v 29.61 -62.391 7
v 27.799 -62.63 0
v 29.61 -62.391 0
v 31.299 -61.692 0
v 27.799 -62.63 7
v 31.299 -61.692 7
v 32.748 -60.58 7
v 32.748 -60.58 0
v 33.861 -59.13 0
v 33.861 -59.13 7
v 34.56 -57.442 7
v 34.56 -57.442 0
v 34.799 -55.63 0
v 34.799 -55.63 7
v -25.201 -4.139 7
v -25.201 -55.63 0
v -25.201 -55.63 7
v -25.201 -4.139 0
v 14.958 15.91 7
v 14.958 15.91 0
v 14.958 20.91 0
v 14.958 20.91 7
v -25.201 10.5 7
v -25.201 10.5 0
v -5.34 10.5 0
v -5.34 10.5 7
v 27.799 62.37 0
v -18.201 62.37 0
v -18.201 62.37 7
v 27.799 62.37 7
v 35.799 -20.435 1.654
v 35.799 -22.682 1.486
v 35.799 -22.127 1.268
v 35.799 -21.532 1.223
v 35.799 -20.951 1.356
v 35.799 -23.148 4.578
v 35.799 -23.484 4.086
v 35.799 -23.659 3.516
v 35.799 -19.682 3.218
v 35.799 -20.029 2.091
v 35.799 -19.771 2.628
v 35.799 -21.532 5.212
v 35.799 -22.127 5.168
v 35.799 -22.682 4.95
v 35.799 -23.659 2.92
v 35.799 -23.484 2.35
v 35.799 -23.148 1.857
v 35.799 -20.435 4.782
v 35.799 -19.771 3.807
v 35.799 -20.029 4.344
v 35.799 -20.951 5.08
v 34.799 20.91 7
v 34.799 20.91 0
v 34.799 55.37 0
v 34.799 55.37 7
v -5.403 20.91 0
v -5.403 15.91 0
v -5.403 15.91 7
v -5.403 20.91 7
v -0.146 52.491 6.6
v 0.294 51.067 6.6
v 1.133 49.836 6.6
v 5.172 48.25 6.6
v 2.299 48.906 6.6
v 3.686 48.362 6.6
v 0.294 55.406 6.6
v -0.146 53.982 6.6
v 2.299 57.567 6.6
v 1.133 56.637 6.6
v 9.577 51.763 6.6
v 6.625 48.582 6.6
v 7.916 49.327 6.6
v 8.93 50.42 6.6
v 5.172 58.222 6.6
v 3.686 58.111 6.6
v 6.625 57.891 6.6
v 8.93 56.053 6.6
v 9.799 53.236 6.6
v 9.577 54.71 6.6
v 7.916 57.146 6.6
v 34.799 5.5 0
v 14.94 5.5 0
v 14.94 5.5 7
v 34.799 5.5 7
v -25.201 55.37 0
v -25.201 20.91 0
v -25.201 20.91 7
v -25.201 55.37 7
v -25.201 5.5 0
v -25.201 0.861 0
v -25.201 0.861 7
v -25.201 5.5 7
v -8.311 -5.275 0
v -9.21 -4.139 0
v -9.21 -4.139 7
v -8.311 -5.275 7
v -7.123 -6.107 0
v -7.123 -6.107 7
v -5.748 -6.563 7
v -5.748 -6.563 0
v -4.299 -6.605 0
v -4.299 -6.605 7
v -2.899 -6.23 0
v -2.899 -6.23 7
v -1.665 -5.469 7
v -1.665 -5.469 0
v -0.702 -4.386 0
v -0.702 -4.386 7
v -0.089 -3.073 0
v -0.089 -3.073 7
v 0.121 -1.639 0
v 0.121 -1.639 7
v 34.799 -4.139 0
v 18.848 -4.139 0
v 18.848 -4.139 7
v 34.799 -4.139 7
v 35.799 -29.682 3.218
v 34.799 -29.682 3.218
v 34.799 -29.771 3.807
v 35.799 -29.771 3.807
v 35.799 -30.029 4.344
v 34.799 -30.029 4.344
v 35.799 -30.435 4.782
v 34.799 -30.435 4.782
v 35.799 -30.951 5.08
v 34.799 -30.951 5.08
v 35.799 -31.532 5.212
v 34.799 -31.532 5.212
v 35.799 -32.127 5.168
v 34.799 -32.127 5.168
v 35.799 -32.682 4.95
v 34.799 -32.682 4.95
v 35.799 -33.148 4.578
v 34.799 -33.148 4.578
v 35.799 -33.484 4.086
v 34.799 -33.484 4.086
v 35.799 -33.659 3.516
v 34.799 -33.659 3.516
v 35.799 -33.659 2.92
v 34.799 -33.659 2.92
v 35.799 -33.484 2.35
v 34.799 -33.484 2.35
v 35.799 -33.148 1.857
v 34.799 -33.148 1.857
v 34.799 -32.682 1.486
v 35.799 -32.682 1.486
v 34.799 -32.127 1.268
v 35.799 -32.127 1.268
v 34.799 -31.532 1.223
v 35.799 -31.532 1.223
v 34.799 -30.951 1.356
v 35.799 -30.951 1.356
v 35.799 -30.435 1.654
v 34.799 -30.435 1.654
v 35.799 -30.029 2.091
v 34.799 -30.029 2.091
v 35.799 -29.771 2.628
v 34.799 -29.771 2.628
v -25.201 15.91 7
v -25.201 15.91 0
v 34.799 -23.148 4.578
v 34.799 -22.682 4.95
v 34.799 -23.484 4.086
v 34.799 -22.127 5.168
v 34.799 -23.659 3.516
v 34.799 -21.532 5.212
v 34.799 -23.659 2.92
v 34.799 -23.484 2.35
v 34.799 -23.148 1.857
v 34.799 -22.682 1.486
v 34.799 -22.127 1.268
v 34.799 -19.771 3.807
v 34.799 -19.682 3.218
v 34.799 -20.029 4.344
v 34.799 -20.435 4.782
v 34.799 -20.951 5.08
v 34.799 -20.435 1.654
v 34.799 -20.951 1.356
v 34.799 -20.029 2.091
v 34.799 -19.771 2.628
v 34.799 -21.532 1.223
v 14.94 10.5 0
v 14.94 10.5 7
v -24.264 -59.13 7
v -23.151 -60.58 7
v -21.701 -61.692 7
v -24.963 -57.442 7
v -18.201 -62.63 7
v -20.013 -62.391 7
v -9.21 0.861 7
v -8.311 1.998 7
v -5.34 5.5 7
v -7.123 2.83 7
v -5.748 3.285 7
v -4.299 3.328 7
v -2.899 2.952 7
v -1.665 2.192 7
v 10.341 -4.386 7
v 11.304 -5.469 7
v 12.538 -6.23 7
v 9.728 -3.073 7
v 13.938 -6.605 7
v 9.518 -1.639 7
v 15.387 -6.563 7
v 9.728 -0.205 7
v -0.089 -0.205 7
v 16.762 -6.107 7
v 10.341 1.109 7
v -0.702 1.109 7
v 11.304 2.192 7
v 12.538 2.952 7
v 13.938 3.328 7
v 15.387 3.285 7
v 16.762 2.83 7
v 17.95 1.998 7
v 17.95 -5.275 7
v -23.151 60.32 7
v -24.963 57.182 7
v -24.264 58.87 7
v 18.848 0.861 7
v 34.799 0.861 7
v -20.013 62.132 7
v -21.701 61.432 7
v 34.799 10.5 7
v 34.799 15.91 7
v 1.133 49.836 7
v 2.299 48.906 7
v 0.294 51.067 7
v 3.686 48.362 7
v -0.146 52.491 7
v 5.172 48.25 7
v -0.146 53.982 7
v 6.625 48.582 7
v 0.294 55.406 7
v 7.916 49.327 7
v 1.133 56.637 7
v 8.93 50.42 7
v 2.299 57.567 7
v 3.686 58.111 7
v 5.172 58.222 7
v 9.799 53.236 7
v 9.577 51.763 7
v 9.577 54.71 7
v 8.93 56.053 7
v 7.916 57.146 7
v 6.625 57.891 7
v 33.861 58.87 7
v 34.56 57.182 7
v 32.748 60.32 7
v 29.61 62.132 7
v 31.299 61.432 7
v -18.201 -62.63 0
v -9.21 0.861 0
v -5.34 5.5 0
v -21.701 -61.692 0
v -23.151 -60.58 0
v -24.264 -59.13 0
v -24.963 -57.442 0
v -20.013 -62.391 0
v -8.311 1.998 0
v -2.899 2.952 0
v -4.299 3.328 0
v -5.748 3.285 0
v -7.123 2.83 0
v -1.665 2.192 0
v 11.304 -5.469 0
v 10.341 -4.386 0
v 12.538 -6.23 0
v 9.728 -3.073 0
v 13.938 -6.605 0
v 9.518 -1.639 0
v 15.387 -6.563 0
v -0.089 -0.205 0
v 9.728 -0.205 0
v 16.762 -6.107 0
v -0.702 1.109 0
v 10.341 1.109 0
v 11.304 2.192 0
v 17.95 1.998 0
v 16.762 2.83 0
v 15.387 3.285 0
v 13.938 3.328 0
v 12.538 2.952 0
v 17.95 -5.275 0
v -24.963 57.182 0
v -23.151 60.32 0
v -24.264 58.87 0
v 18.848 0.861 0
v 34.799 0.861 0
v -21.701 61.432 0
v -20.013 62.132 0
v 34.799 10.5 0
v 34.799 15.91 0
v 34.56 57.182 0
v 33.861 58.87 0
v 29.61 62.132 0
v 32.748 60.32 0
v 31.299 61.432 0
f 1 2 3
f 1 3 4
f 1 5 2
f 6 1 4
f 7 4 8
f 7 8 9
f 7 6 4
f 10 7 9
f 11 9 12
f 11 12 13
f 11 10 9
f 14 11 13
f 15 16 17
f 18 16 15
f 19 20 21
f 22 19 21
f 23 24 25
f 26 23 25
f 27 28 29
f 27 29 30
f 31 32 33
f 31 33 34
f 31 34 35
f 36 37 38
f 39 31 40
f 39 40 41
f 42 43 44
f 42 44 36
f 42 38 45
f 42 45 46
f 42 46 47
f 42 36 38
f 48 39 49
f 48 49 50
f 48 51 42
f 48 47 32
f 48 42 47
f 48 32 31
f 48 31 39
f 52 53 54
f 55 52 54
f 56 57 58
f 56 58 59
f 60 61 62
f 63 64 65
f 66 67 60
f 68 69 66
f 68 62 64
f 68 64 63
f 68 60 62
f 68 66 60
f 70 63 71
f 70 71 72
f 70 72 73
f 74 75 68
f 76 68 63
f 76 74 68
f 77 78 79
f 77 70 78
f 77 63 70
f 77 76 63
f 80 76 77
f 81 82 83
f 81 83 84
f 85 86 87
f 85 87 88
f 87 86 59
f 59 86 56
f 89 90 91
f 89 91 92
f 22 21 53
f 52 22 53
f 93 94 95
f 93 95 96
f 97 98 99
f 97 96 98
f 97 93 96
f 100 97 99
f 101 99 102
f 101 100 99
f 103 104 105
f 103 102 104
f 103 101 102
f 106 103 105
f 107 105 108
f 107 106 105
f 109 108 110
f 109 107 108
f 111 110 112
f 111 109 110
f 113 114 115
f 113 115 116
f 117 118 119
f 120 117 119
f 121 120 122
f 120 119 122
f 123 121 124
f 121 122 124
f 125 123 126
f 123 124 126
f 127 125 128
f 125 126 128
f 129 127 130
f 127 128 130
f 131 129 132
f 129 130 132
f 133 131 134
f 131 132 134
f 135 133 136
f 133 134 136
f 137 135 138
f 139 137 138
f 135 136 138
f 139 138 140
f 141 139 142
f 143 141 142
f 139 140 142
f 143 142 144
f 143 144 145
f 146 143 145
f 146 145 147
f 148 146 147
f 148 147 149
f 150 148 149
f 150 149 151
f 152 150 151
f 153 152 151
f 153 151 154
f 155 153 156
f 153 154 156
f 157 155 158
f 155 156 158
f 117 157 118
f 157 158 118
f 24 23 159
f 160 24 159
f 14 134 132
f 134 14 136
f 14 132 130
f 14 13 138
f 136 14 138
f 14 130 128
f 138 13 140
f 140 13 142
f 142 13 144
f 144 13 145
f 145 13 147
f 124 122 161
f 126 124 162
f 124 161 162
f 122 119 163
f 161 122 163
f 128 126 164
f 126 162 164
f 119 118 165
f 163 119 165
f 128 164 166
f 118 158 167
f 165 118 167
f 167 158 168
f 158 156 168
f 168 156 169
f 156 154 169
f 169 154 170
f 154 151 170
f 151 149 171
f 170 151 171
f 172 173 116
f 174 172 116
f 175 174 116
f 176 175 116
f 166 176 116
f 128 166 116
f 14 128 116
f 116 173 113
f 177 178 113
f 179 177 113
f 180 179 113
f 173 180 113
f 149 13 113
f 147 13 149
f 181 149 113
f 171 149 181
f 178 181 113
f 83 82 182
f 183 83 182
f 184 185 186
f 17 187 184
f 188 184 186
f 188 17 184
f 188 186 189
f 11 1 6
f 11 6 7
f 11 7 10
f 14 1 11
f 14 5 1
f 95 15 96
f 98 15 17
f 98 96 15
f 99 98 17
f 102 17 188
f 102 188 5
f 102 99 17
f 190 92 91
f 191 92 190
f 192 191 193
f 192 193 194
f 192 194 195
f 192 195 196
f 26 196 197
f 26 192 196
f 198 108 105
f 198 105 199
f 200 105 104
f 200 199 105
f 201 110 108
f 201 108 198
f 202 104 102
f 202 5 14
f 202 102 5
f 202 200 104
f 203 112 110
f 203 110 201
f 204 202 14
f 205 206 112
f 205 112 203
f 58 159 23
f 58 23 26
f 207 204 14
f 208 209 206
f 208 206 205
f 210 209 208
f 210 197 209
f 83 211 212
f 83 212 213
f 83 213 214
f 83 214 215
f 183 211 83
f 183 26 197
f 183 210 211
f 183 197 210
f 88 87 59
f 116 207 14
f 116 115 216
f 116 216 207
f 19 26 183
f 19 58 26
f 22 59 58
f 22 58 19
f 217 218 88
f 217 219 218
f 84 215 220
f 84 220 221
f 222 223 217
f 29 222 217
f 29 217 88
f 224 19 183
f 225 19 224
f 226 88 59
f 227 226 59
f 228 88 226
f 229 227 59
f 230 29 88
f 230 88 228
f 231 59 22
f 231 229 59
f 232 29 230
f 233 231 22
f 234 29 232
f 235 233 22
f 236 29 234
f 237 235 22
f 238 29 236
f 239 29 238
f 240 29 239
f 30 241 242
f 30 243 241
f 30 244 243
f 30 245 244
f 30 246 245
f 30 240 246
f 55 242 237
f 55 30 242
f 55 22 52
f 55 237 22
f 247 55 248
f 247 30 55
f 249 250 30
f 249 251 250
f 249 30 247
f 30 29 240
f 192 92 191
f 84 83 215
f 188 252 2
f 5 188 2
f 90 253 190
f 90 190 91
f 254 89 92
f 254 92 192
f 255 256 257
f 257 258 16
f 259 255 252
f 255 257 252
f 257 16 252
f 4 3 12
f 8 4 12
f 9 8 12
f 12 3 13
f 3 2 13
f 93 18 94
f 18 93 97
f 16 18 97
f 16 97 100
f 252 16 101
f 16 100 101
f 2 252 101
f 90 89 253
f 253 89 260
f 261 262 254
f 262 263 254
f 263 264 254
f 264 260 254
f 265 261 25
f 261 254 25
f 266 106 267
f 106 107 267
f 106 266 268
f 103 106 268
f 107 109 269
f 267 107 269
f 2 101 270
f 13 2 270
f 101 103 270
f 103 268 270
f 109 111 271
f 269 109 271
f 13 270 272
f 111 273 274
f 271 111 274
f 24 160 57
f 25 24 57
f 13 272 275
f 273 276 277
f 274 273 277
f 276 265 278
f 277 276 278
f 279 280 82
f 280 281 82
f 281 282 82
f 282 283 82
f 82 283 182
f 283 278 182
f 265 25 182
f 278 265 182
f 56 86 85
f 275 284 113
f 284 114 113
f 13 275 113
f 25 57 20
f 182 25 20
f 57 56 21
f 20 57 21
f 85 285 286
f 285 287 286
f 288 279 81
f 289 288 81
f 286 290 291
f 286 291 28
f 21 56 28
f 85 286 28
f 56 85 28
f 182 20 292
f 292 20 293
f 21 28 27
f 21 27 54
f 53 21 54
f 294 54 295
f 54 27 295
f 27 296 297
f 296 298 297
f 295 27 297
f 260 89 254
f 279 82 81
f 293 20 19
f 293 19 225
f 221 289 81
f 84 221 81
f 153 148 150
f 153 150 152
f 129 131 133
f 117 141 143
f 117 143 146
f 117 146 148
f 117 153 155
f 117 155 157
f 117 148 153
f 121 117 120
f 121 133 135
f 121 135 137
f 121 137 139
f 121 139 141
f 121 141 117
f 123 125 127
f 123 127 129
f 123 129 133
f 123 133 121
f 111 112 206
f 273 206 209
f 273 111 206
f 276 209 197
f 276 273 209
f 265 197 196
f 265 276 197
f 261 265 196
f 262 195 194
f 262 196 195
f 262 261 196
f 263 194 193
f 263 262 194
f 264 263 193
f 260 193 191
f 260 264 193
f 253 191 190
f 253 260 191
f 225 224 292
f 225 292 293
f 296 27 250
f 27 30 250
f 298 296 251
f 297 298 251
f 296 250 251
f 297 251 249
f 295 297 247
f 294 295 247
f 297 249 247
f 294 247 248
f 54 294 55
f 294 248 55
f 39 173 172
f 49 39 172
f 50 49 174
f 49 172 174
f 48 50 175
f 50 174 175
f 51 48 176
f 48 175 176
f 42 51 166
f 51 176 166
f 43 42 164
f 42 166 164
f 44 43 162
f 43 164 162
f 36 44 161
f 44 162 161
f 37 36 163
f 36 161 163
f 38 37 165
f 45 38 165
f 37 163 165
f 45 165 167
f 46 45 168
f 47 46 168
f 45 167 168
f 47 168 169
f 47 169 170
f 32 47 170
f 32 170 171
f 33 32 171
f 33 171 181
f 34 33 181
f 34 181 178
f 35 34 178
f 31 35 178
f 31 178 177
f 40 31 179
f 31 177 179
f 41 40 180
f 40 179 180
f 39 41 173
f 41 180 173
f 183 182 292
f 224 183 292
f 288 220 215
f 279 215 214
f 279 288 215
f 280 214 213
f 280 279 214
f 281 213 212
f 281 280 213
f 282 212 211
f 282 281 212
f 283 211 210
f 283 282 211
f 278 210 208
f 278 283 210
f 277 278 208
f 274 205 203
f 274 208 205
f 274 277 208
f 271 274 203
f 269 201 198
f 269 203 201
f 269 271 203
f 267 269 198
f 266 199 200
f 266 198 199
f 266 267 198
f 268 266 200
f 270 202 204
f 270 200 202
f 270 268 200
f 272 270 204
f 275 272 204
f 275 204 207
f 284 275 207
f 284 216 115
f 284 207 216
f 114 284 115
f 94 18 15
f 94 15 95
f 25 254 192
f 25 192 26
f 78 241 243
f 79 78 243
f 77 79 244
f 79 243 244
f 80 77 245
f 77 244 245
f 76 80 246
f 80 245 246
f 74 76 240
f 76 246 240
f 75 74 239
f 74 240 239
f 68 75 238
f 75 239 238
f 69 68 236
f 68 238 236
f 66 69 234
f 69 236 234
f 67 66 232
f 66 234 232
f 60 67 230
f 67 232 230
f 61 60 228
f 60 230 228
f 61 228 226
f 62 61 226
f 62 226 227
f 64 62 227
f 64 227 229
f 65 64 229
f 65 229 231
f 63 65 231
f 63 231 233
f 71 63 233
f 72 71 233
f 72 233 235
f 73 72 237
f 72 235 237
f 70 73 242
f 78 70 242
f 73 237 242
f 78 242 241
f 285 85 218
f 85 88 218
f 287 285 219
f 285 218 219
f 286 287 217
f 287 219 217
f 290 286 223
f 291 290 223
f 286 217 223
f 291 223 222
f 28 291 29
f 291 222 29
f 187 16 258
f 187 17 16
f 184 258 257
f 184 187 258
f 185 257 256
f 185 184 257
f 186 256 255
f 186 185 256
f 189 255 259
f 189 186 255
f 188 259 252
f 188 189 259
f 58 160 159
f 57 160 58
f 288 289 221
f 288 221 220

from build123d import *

# Parameters (mm, degrees)
F0_W      = 60
F0_H      = 125
F1_DEPTH  = 7
F2_R      = 7
F3_R      = 7
F4_R      = 7
F5_R      = 2
F6_DEPTH  = 1
F9_W      = 20
F9_H      = 5
F10_DEPTH = 88.1
F7_R      = 5
F12_DEPTH = 0.4


# Not quite as in the source:
# - the program builds the solid bodies; features that only make, move or delete a surface that nothing else refers to are left out


with BuildPart() as f1:
    # F0 (on Top) → F1 (new body)
    with BuildSketch(Plane.XY):
        with Locations((4.798640497, -0.129804003)):
            Rectangle(F0_W, F0_H)
    extrude(amount=F1_DEPTH)

    # F2
    f2_edges = [f1.edges().sort_by_distance(p)[0] for p in [
        (-25.20136, -62.629804, 3.5),
    ]]
    fillet(f2_edges, radius=F2_R)

    # F3
    f3_edges = [f1.edges().sort_by_distance(p)[0] for p in [
        (-25.20136, 62.370196, 3.5),
        (34.79864, -62.629804, 3.5),
    ]]
    fillet(f3_edges, radius=F3_R)

    # F4
    f4_edges = [f1.edges().sort_by_distance(p)[0] for p in [
        (34.79864, 62.370196, 3.5),
    ]]
    fillet(f4_edges, radius=F4_R)

    # F5 (on face) → F6 (join)
    with BuildSketch(Plane.YZ.offset(34.798640497)):
        with Locations((-31.6818073764, 3.2178394031)):
            Circle(F5_R)
        with Locations((-21.6818073764, 3.2178394031)):
            Circle(F5_R)
    extrude(amount=F6_DEPTH)

    # F9 (on Top) → F10 (cut)
    with BuildSketch(Plane.XY):
        with Locations((-15.4034045642, 18.4103432111)):
            Rectangle(F9_W, F9_H)
        with Locations((24.9580888633, 18.4103432111)):
            Rectangle(F9_W, F9_H)
        with Locations((-15.3402814512, 8.0003063194)):
            Rectangle(F9_W, F9_H)
        with Locations((24.940414155, 8.0003063194)):
            Rectangle(F9_W, F9_H)
        with BuildLine():
            Line((-9.2095649145, 0.8613835648), (-25.9844651689, 0.8613835648))
            Line((-25.9844651689, 0.8613835648), (-25.9844651689, -4.1386164352))
            Line((-25.9844651689, -4.1386164352), (-9.2095649145, -4.1386164352))
            ThreePointArc((-9.2095649145, -4.1386164352), (-9.8794378956, -1.6386164352), (-9.2095649145, 0.8613835648))
        make_face()
        with BuildLine():
            ThreePointArc((0.1205621044, -1.6386164352), (-3.5853426701, 3.1910126962), (-9.2095649145, 0.8613835648))
            ThreePointArc((-9.2095649145, 0.8613835648), (-9.8794378956, -1.6386164352), (-9.2095649145, -4.1386164352))
            ThreePointArc((-9.2095649145, -4.1386164352), (-3.5853426701, -6.4682455667), (0.1205621044, -1.6386164352))
        make_face()
        with BuildLine():
            Line((36.6257494559, -4.1386164352), (36.6257494559, 0.8613835648))
            Line((36.6257494559, 0.8613835648), (18.8484872035, 0.8613835648))
            ThreePointArc((18.8484872035, 0.8613835648), (9.5183601846, -1.6386164352), (18.8484872035, -4.1386164352))
            Line((18.8484872035, -4.1386164352), (36.6257494559, -4.1386164352))
        make_face()
    extrude(amount=F10_DEPTH, mode=Mode.SUBTRACT)

    # F7 (on face) → F12 (cut)
    with BuildSketch(Plane.XY.offset(7)):
        with Locations((4.798640497, 53.2364137471)):
            Circle(F7_R)
    extrude(amount=-F12_DEPTH, mode=Mode.SUBTRACT)


solid = f1.part
